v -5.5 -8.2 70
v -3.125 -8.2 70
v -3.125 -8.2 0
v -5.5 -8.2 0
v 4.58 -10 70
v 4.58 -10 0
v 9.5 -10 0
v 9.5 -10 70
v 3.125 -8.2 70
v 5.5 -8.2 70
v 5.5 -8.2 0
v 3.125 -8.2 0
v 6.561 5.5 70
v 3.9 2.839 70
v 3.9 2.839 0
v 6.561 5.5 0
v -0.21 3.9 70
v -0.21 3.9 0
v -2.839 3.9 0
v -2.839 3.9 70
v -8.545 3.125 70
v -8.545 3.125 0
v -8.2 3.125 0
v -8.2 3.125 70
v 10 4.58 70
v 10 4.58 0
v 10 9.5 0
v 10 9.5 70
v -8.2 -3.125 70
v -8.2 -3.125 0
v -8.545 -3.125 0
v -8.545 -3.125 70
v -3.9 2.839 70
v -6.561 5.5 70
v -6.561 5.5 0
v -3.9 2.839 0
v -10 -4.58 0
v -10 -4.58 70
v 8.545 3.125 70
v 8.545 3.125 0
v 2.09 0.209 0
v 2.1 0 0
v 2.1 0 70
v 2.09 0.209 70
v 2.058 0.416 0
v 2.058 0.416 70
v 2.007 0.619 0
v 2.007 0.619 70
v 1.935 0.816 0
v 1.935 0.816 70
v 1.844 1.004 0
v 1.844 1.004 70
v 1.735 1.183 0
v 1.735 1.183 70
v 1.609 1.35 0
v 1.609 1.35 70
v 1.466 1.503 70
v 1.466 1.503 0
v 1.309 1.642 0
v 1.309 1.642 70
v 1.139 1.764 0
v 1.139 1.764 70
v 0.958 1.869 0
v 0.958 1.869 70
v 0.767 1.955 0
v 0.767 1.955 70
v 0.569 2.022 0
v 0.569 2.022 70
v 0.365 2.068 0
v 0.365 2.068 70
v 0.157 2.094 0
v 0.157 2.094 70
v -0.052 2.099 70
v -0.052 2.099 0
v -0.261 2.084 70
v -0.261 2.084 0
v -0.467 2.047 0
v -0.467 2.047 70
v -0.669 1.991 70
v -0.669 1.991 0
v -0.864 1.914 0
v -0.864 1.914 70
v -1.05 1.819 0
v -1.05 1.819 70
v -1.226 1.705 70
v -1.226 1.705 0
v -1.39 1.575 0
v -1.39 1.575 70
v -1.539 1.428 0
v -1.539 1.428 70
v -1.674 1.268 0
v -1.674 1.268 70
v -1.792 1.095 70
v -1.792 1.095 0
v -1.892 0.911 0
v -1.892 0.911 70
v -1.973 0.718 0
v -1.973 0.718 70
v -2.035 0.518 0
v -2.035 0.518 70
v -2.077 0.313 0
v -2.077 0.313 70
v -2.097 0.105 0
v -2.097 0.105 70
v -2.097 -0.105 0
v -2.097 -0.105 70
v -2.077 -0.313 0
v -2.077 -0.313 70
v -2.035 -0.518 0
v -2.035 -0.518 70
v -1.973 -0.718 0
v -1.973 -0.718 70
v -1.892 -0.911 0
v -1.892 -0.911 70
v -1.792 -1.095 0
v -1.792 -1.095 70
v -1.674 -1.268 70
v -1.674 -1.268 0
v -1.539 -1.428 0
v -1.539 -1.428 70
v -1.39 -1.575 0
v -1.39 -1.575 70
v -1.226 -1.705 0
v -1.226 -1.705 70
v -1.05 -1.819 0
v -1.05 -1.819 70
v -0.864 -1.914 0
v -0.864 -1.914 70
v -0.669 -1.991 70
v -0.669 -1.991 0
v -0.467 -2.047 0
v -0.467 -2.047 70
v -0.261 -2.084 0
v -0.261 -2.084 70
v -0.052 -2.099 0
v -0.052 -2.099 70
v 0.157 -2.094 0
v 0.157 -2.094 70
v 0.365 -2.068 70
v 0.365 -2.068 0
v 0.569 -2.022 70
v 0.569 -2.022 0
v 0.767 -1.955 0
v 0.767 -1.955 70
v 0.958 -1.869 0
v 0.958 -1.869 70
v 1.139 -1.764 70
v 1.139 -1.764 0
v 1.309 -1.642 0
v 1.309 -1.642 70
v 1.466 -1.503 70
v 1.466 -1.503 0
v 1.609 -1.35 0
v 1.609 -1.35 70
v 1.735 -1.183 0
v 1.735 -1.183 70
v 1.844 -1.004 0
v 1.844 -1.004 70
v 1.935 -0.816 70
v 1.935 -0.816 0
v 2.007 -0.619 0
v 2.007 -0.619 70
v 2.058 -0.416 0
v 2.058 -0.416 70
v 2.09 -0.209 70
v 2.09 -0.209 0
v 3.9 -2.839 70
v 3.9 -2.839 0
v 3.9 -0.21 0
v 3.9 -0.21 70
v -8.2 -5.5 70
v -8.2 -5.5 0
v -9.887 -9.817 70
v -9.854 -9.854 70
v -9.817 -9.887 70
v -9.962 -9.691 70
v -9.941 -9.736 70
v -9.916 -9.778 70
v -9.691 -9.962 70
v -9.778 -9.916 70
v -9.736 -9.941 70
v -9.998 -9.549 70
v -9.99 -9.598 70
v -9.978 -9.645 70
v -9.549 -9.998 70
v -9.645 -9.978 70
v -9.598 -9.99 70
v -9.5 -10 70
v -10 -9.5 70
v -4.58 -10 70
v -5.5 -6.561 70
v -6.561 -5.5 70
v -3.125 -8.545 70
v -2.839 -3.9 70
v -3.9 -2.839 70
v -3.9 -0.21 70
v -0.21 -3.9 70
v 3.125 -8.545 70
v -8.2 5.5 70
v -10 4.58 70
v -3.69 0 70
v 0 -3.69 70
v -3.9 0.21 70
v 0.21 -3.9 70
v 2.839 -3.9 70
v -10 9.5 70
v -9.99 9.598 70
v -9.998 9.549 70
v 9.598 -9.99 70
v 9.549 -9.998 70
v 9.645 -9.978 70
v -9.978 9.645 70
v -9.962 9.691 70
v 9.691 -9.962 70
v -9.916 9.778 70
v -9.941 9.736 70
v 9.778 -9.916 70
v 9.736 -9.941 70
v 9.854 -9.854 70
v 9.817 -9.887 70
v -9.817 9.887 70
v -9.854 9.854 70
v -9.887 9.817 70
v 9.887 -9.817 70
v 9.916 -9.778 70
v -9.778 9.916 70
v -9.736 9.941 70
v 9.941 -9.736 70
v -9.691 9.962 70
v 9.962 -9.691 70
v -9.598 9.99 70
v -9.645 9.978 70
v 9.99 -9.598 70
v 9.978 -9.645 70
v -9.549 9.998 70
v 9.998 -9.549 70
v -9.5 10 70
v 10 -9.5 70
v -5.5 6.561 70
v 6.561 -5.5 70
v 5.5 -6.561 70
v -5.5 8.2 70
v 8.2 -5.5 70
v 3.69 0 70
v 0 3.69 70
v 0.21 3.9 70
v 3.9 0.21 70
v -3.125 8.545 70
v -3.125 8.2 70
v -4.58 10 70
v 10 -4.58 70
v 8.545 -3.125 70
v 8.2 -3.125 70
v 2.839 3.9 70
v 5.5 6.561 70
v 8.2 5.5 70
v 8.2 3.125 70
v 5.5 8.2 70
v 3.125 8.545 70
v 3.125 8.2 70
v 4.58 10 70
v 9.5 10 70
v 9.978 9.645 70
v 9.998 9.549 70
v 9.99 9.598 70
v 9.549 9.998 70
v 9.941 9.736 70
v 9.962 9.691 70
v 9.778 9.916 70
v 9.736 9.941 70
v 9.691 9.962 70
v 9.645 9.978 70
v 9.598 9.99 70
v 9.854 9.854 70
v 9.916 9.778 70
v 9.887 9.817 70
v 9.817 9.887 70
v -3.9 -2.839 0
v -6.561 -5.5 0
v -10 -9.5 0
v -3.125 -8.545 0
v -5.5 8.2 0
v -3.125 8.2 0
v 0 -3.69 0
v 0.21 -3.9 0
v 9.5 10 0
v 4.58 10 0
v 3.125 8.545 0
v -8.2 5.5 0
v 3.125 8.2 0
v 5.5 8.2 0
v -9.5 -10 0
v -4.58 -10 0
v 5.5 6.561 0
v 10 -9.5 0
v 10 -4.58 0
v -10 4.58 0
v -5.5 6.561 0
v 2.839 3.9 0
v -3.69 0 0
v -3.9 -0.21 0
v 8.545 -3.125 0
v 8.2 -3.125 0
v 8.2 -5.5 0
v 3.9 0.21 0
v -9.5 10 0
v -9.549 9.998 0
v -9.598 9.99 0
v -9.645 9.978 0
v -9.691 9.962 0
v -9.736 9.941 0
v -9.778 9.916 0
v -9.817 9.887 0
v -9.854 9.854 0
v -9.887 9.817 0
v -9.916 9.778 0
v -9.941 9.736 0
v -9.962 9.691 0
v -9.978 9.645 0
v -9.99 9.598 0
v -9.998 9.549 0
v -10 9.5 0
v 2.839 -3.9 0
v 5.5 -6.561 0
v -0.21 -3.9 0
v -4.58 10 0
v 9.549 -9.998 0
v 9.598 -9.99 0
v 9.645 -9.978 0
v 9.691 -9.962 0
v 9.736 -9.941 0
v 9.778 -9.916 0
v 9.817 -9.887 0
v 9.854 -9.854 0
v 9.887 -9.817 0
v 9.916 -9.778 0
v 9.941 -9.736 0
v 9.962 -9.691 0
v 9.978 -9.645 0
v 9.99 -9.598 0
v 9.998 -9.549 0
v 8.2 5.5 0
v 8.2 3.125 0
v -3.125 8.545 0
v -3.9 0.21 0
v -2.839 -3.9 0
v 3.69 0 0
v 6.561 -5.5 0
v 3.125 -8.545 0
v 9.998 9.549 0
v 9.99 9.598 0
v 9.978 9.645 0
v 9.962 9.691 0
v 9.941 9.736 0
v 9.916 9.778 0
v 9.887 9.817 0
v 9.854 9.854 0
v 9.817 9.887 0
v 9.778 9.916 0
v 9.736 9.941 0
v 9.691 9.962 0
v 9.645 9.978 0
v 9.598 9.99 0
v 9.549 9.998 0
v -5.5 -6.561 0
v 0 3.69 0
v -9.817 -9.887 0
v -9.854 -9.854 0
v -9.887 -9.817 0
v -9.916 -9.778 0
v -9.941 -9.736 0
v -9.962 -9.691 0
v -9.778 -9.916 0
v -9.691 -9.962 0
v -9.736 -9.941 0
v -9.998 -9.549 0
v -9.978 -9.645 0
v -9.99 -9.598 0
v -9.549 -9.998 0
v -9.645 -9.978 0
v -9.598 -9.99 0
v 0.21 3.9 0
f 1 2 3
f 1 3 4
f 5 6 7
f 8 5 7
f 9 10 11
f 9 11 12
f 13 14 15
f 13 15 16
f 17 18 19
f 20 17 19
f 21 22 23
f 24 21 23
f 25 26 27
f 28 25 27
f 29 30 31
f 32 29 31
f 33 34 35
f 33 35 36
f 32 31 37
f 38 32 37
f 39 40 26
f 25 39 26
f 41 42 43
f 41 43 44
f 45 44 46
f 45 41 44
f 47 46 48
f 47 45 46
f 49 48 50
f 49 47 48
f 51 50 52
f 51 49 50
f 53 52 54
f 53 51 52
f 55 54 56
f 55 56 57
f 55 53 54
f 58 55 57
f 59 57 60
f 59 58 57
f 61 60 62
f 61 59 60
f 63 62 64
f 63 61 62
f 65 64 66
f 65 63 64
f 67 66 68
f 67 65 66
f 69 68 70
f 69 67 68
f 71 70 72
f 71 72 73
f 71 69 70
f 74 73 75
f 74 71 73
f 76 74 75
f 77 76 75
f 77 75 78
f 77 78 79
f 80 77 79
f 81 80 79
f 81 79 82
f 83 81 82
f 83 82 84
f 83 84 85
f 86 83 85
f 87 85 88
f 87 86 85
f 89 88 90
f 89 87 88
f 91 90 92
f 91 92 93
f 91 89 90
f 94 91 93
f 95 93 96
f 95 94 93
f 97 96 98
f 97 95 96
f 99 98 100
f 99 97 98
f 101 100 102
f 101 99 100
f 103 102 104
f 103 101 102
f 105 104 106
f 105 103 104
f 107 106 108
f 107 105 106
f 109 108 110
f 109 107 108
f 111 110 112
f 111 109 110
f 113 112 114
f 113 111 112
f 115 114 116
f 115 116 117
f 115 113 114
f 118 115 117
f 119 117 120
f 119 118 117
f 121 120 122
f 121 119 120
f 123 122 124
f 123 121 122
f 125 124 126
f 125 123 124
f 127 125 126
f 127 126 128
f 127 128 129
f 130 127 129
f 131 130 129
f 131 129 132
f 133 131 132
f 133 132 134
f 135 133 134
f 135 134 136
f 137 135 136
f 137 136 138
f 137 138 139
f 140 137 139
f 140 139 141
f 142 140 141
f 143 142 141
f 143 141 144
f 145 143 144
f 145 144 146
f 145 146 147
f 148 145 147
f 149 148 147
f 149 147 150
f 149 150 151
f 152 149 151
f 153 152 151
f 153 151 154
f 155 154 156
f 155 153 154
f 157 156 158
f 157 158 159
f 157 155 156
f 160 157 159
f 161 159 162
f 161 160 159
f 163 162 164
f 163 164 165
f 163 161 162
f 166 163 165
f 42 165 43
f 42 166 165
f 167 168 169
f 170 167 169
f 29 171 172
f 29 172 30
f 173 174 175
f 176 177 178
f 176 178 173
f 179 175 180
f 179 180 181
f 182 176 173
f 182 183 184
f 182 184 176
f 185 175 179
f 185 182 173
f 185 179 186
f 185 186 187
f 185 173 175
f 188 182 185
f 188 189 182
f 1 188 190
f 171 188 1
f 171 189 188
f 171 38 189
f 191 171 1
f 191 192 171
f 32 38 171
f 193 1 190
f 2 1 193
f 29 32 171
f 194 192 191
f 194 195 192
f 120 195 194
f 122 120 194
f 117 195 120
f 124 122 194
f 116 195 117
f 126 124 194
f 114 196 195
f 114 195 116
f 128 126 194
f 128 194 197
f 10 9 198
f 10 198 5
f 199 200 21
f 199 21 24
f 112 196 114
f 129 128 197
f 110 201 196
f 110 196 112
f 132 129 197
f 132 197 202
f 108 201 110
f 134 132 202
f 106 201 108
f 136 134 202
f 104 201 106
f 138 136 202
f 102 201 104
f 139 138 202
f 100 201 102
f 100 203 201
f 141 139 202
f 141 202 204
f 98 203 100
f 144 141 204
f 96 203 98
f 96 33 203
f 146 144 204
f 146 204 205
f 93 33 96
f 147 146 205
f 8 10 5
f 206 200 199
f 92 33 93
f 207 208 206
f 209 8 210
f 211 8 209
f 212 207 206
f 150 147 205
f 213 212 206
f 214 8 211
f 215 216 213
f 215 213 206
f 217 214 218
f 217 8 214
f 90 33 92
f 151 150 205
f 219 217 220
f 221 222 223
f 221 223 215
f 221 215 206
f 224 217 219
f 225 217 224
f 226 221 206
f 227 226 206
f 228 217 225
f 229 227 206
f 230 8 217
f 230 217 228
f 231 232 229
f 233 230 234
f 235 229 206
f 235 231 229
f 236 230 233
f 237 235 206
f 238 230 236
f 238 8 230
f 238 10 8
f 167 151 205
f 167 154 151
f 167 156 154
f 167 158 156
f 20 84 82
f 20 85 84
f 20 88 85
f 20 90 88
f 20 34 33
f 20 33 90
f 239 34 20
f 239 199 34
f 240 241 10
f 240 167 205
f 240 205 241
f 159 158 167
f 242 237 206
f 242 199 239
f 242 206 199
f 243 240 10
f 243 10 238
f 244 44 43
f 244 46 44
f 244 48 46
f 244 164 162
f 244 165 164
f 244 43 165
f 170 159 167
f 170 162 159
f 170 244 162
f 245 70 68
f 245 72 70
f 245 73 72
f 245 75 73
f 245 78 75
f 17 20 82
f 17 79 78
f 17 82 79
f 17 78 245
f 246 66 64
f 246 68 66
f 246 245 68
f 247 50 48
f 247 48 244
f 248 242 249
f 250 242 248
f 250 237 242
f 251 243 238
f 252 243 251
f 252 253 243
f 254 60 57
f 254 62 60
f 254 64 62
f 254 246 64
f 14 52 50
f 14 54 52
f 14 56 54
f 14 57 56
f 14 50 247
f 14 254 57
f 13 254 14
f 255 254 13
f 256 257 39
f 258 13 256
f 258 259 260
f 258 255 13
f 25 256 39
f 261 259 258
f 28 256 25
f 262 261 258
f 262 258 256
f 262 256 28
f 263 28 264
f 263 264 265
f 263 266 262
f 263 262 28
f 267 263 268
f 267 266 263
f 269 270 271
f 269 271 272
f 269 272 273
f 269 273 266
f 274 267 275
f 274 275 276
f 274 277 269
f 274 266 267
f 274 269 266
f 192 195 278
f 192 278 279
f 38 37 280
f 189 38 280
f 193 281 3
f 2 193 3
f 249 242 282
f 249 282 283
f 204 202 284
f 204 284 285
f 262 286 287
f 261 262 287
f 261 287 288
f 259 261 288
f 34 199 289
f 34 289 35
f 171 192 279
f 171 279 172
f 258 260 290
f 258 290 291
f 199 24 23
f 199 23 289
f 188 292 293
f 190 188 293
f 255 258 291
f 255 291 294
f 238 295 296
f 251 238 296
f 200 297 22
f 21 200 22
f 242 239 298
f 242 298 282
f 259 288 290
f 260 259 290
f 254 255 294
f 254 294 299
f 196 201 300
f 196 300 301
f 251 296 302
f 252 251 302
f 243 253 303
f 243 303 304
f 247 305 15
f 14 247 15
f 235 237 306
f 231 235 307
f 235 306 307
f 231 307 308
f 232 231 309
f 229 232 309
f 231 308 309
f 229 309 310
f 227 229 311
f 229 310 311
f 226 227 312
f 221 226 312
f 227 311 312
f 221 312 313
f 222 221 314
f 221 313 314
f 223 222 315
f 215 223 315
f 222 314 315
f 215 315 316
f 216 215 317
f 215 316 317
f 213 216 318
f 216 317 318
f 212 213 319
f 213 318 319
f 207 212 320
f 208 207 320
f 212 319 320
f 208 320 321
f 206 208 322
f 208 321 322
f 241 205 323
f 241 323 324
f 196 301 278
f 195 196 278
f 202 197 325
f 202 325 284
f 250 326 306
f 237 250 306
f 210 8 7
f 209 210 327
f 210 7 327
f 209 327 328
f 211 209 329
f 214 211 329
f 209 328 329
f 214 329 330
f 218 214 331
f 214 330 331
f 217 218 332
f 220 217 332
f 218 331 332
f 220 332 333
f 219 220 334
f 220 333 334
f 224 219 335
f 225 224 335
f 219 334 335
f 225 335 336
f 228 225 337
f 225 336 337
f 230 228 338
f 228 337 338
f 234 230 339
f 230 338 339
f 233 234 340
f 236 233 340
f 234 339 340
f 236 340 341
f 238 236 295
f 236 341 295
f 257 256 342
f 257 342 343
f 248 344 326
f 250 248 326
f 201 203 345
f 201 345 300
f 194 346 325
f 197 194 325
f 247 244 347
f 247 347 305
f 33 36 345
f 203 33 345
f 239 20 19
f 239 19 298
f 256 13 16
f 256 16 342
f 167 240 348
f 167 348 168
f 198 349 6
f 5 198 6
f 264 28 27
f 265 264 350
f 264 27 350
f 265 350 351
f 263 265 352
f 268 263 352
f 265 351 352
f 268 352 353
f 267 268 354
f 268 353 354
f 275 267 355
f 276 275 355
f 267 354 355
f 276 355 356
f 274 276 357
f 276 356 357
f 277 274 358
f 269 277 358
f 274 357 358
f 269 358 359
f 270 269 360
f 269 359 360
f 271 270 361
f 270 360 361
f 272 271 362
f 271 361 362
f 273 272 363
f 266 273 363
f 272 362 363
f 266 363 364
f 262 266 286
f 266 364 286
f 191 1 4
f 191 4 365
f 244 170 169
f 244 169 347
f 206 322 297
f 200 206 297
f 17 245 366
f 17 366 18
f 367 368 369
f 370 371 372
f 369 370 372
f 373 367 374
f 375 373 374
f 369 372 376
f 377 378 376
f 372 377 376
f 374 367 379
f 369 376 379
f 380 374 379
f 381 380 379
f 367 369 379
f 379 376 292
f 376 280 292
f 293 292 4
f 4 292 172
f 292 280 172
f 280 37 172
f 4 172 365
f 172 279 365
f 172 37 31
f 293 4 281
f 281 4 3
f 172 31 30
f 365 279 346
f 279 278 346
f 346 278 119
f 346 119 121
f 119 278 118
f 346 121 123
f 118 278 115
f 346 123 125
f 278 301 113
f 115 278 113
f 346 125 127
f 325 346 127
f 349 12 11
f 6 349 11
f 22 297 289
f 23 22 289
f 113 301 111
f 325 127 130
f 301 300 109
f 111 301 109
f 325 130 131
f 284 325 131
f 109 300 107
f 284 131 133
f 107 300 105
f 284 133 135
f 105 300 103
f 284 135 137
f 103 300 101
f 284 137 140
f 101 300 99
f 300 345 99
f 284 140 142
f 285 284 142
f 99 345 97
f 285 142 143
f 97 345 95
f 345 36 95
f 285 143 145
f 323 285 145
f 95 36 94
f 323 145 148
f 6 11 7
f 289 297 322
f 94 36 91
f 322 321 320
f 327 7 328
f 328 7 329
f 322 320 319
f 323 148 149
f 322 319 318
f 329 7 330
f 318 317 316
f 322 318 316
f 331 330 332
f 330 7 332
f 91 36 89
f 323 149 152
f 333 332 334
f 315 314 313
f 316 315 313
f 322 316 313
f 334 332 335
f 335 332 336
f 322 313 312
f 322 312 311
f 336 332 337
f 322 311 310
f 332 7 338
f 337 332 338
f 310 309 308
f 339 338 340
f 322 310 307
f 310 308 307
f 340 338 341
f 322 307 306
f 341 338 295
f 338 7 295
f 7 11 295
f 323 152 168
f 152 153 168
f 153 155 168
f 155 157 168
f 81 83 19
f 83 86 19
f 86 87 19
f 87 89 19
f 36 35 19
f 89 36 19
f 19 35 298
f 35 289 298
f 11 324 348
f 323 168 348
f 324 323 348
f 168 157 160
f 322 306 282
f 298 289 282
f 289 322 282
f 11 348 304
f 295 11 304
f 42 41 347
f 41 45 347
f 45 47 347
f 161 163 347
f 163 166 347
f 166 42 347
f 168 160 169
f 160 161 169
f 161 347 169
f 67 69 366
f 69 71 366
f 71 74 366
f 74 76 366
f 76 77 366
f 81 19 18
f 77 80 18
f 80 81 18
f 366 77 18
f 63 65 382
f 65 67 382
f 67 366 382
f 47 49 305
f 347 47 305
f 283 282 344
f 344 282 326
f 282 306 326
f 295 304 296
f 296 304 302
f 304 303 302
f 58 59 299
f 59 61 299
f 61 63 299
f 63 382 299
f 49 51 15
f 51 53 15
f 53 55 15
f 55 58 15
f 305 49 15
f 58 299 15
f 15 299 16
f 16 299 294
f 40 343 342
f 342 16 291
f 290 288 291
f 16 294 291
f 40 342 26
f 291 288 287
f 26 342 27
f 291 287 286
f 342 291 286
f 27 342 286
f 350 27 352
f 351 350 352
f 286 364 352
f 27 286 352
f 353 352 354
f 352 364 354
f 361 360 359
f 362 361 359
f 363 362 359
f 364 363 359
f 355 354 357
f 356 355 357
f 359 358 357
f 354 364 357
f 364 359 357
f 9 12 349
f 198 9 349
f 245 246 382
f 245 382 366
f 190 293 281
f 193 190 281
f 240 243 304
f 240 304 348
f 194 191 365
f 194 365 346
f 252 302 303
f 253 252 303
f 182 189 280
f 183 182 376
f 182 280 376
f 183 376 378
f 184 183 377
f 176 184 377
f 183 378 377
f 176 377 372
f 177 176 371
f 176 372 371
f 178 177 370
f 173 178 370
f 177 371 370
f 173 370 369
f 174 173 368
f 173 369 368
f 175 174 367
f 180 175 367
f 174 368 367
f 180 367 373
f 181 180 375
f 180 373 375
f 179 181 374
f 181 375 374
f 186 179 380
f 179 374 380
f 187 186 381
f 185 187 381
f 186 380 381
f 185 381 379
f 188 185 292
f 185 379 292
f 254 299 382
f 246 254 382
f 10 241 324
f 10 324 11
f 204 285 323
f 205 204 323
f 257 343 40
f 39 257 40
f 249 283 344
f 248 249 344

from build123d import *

# Parameters (mm, degrees)
ESBO_O1_R                = 2.1
RESSALTO_EXTRUS_O1_DEPTH = 70


with BuildPart() as part:
    # Esboço1 → Ressalto-extrusão1 (new body)
    with BuildSketch(Plane.XY):
        with BuildLine():
            Line((3.9, -0.21), (3.69, 0))
            Line((3.69, 0), (3.9, 0.21))
            Line((3.9, 0.21), (3.9, 2.839339828))
            Line((3.9, 2.839339828), (6.560660172, 5.5))
            Line((6.560660172, 5.5), (8.2, 5.5))
            Line((8.2, 5.5), (8.2, 3.125))
            Line((8.2, 3.125), (8.545, 3.125))
            Line((8.545, 3.125), (10, 4.58))
            Line((10, 4.58), (10, 9.5))
            ThreePointArc((10, 9.5), (9.853553391, 9.853553391), (9.5, 10))
            Line((9.5, 10), (4.58, 10))
            Line((4.58, 10), (3.125, 8.545))
            Line((3.125, 8.545), (3.125, 8.2))
            Line((3.125, 8.2), (5.5, 8.2))
            Line((5.5, 8.2), (5.5, 6.560660172))
            Line((5.5, 6.560660172), (2.839339828, 3.9))
            Line((2.839339828, 3.9), (0.21, 3.9))
            Line((0.21, 3.9), (0, 3.69))
            Line((0, 3.69), (-0.21, 3.9))
            Line((-0.21, 3.9), (-2.839339828, 3.9))
            Line((-2.839339828, 3.9), (-5.5, 6.560660172))
            Line((-5.5, 6.560660172), (-5.5, 8.2))
            Line((-5.5, 8.2), (-3.125, 8.2))
            Line((-3.125, 8.2), (-3.125, 8.545))
            Line((-3.125, 8.545), (-4.58, 10))
            Line((-4.58, 10), (-9.5, 10))
            ThreePointArc((-9.5, 10), (-9.853553391, 9.853553391), (-10, 9.5))
            Line((-10, 9.5), (-10, 4.58))
            Line((-10, 4.58), (-8.545, 3.125))
            Line((-8.545, 3.125), (-8.2, 3.125))
            Line((-8.2, 3.125), (-8.2, 5.5))
            Line((-8.2, 5.5), (-6.560660172, 5.5))
            Line((-6.560660172, 5.5), (-3.9, 2.839339828))
            Line((-3.9, 2.839339828), (-3.9, 0.21))
            Line((-3.9, 0.21), (-3.69, 0))
            Line((-3.69, 0), (-3.9, -0.21))
            Line((-3.9, -0.21), (-3.9, -2.839339828))
            Line((-3.9, -2.839339828), (-6.560660172, -5.5))
            Line((-6.560660172, -5.5), (-8.2, -5.5))
            Line((-8.2, -5.5), (-8.2, -3.125))
            Line((-8.2, -3.125), (-8.545, -3.125))
            Line((-8.545, -3.125), (-10, -4.58))
            Line((-10, -4.58), (-10, -9.5))
            ThreePointArc((-10, -9.5), (-9.853553391, -9.853553391), (-9.5, -10))
            Line((-9.5, -10), (-4.58, -10))
            Line((-4.58, -10), (-3.125, -8.545))
            Line((-3.125, -8.545), (-3.125, -8.2))
            Line((-3.125, -8.2), (-5.5, -8.2))
            Line((-5.5, -8.2), (-5.5, -6.560660172))
            Line((-5.5, -6.560660172), (-2.839339828, -3.9))
            Line((-2.839339828, -3.9), (-0.21, -3.9))
            Line((-0.21, -3.9), (0, -3.69))
            Line((0, -3.69), (0.21, -3.9))
            Line((0.21, -3.9), (2.839339828, -3.9))
            Line((2.839339828, -3.9), (5.5, -6.560660172))
            Line((5.5, -6.560660172), (5.5, -8.2))
            Line((5.5, -8.2), (3.125, -8.2))
            Line((3.125, -8.2), (3.125, -8.545))
            Line((3.125, -8.545), (4.58, -10))
            Line((4.58, -10), (9.5, -10))
            ThreePointArc((9.5, -10), (9.853553391, -9.853553391), (10, -9.5))
            Line((10, -9.5), (10, -4.58))
            Line((10, -4.58), (8.545, -3.125))
            Line((8.545, -3.125), (8.2, -3.125))
            Line((8.2, -3.125), (8.2, -5.5))
            Line((8.2, -5.5), (6.560660172, -5.5))
            Line((6.560660172, -5.5), (3.9, -2.839339828))
            Line((3.9, -2.839339828), (3.9, -0.21))
        make_face()
        Circle(ESBO_O1_R, mode=Mode.SUBTRACT)
    extrude(amount=RESSALTO_EXTRUS_O1_DEPTH)


solid = part.part
